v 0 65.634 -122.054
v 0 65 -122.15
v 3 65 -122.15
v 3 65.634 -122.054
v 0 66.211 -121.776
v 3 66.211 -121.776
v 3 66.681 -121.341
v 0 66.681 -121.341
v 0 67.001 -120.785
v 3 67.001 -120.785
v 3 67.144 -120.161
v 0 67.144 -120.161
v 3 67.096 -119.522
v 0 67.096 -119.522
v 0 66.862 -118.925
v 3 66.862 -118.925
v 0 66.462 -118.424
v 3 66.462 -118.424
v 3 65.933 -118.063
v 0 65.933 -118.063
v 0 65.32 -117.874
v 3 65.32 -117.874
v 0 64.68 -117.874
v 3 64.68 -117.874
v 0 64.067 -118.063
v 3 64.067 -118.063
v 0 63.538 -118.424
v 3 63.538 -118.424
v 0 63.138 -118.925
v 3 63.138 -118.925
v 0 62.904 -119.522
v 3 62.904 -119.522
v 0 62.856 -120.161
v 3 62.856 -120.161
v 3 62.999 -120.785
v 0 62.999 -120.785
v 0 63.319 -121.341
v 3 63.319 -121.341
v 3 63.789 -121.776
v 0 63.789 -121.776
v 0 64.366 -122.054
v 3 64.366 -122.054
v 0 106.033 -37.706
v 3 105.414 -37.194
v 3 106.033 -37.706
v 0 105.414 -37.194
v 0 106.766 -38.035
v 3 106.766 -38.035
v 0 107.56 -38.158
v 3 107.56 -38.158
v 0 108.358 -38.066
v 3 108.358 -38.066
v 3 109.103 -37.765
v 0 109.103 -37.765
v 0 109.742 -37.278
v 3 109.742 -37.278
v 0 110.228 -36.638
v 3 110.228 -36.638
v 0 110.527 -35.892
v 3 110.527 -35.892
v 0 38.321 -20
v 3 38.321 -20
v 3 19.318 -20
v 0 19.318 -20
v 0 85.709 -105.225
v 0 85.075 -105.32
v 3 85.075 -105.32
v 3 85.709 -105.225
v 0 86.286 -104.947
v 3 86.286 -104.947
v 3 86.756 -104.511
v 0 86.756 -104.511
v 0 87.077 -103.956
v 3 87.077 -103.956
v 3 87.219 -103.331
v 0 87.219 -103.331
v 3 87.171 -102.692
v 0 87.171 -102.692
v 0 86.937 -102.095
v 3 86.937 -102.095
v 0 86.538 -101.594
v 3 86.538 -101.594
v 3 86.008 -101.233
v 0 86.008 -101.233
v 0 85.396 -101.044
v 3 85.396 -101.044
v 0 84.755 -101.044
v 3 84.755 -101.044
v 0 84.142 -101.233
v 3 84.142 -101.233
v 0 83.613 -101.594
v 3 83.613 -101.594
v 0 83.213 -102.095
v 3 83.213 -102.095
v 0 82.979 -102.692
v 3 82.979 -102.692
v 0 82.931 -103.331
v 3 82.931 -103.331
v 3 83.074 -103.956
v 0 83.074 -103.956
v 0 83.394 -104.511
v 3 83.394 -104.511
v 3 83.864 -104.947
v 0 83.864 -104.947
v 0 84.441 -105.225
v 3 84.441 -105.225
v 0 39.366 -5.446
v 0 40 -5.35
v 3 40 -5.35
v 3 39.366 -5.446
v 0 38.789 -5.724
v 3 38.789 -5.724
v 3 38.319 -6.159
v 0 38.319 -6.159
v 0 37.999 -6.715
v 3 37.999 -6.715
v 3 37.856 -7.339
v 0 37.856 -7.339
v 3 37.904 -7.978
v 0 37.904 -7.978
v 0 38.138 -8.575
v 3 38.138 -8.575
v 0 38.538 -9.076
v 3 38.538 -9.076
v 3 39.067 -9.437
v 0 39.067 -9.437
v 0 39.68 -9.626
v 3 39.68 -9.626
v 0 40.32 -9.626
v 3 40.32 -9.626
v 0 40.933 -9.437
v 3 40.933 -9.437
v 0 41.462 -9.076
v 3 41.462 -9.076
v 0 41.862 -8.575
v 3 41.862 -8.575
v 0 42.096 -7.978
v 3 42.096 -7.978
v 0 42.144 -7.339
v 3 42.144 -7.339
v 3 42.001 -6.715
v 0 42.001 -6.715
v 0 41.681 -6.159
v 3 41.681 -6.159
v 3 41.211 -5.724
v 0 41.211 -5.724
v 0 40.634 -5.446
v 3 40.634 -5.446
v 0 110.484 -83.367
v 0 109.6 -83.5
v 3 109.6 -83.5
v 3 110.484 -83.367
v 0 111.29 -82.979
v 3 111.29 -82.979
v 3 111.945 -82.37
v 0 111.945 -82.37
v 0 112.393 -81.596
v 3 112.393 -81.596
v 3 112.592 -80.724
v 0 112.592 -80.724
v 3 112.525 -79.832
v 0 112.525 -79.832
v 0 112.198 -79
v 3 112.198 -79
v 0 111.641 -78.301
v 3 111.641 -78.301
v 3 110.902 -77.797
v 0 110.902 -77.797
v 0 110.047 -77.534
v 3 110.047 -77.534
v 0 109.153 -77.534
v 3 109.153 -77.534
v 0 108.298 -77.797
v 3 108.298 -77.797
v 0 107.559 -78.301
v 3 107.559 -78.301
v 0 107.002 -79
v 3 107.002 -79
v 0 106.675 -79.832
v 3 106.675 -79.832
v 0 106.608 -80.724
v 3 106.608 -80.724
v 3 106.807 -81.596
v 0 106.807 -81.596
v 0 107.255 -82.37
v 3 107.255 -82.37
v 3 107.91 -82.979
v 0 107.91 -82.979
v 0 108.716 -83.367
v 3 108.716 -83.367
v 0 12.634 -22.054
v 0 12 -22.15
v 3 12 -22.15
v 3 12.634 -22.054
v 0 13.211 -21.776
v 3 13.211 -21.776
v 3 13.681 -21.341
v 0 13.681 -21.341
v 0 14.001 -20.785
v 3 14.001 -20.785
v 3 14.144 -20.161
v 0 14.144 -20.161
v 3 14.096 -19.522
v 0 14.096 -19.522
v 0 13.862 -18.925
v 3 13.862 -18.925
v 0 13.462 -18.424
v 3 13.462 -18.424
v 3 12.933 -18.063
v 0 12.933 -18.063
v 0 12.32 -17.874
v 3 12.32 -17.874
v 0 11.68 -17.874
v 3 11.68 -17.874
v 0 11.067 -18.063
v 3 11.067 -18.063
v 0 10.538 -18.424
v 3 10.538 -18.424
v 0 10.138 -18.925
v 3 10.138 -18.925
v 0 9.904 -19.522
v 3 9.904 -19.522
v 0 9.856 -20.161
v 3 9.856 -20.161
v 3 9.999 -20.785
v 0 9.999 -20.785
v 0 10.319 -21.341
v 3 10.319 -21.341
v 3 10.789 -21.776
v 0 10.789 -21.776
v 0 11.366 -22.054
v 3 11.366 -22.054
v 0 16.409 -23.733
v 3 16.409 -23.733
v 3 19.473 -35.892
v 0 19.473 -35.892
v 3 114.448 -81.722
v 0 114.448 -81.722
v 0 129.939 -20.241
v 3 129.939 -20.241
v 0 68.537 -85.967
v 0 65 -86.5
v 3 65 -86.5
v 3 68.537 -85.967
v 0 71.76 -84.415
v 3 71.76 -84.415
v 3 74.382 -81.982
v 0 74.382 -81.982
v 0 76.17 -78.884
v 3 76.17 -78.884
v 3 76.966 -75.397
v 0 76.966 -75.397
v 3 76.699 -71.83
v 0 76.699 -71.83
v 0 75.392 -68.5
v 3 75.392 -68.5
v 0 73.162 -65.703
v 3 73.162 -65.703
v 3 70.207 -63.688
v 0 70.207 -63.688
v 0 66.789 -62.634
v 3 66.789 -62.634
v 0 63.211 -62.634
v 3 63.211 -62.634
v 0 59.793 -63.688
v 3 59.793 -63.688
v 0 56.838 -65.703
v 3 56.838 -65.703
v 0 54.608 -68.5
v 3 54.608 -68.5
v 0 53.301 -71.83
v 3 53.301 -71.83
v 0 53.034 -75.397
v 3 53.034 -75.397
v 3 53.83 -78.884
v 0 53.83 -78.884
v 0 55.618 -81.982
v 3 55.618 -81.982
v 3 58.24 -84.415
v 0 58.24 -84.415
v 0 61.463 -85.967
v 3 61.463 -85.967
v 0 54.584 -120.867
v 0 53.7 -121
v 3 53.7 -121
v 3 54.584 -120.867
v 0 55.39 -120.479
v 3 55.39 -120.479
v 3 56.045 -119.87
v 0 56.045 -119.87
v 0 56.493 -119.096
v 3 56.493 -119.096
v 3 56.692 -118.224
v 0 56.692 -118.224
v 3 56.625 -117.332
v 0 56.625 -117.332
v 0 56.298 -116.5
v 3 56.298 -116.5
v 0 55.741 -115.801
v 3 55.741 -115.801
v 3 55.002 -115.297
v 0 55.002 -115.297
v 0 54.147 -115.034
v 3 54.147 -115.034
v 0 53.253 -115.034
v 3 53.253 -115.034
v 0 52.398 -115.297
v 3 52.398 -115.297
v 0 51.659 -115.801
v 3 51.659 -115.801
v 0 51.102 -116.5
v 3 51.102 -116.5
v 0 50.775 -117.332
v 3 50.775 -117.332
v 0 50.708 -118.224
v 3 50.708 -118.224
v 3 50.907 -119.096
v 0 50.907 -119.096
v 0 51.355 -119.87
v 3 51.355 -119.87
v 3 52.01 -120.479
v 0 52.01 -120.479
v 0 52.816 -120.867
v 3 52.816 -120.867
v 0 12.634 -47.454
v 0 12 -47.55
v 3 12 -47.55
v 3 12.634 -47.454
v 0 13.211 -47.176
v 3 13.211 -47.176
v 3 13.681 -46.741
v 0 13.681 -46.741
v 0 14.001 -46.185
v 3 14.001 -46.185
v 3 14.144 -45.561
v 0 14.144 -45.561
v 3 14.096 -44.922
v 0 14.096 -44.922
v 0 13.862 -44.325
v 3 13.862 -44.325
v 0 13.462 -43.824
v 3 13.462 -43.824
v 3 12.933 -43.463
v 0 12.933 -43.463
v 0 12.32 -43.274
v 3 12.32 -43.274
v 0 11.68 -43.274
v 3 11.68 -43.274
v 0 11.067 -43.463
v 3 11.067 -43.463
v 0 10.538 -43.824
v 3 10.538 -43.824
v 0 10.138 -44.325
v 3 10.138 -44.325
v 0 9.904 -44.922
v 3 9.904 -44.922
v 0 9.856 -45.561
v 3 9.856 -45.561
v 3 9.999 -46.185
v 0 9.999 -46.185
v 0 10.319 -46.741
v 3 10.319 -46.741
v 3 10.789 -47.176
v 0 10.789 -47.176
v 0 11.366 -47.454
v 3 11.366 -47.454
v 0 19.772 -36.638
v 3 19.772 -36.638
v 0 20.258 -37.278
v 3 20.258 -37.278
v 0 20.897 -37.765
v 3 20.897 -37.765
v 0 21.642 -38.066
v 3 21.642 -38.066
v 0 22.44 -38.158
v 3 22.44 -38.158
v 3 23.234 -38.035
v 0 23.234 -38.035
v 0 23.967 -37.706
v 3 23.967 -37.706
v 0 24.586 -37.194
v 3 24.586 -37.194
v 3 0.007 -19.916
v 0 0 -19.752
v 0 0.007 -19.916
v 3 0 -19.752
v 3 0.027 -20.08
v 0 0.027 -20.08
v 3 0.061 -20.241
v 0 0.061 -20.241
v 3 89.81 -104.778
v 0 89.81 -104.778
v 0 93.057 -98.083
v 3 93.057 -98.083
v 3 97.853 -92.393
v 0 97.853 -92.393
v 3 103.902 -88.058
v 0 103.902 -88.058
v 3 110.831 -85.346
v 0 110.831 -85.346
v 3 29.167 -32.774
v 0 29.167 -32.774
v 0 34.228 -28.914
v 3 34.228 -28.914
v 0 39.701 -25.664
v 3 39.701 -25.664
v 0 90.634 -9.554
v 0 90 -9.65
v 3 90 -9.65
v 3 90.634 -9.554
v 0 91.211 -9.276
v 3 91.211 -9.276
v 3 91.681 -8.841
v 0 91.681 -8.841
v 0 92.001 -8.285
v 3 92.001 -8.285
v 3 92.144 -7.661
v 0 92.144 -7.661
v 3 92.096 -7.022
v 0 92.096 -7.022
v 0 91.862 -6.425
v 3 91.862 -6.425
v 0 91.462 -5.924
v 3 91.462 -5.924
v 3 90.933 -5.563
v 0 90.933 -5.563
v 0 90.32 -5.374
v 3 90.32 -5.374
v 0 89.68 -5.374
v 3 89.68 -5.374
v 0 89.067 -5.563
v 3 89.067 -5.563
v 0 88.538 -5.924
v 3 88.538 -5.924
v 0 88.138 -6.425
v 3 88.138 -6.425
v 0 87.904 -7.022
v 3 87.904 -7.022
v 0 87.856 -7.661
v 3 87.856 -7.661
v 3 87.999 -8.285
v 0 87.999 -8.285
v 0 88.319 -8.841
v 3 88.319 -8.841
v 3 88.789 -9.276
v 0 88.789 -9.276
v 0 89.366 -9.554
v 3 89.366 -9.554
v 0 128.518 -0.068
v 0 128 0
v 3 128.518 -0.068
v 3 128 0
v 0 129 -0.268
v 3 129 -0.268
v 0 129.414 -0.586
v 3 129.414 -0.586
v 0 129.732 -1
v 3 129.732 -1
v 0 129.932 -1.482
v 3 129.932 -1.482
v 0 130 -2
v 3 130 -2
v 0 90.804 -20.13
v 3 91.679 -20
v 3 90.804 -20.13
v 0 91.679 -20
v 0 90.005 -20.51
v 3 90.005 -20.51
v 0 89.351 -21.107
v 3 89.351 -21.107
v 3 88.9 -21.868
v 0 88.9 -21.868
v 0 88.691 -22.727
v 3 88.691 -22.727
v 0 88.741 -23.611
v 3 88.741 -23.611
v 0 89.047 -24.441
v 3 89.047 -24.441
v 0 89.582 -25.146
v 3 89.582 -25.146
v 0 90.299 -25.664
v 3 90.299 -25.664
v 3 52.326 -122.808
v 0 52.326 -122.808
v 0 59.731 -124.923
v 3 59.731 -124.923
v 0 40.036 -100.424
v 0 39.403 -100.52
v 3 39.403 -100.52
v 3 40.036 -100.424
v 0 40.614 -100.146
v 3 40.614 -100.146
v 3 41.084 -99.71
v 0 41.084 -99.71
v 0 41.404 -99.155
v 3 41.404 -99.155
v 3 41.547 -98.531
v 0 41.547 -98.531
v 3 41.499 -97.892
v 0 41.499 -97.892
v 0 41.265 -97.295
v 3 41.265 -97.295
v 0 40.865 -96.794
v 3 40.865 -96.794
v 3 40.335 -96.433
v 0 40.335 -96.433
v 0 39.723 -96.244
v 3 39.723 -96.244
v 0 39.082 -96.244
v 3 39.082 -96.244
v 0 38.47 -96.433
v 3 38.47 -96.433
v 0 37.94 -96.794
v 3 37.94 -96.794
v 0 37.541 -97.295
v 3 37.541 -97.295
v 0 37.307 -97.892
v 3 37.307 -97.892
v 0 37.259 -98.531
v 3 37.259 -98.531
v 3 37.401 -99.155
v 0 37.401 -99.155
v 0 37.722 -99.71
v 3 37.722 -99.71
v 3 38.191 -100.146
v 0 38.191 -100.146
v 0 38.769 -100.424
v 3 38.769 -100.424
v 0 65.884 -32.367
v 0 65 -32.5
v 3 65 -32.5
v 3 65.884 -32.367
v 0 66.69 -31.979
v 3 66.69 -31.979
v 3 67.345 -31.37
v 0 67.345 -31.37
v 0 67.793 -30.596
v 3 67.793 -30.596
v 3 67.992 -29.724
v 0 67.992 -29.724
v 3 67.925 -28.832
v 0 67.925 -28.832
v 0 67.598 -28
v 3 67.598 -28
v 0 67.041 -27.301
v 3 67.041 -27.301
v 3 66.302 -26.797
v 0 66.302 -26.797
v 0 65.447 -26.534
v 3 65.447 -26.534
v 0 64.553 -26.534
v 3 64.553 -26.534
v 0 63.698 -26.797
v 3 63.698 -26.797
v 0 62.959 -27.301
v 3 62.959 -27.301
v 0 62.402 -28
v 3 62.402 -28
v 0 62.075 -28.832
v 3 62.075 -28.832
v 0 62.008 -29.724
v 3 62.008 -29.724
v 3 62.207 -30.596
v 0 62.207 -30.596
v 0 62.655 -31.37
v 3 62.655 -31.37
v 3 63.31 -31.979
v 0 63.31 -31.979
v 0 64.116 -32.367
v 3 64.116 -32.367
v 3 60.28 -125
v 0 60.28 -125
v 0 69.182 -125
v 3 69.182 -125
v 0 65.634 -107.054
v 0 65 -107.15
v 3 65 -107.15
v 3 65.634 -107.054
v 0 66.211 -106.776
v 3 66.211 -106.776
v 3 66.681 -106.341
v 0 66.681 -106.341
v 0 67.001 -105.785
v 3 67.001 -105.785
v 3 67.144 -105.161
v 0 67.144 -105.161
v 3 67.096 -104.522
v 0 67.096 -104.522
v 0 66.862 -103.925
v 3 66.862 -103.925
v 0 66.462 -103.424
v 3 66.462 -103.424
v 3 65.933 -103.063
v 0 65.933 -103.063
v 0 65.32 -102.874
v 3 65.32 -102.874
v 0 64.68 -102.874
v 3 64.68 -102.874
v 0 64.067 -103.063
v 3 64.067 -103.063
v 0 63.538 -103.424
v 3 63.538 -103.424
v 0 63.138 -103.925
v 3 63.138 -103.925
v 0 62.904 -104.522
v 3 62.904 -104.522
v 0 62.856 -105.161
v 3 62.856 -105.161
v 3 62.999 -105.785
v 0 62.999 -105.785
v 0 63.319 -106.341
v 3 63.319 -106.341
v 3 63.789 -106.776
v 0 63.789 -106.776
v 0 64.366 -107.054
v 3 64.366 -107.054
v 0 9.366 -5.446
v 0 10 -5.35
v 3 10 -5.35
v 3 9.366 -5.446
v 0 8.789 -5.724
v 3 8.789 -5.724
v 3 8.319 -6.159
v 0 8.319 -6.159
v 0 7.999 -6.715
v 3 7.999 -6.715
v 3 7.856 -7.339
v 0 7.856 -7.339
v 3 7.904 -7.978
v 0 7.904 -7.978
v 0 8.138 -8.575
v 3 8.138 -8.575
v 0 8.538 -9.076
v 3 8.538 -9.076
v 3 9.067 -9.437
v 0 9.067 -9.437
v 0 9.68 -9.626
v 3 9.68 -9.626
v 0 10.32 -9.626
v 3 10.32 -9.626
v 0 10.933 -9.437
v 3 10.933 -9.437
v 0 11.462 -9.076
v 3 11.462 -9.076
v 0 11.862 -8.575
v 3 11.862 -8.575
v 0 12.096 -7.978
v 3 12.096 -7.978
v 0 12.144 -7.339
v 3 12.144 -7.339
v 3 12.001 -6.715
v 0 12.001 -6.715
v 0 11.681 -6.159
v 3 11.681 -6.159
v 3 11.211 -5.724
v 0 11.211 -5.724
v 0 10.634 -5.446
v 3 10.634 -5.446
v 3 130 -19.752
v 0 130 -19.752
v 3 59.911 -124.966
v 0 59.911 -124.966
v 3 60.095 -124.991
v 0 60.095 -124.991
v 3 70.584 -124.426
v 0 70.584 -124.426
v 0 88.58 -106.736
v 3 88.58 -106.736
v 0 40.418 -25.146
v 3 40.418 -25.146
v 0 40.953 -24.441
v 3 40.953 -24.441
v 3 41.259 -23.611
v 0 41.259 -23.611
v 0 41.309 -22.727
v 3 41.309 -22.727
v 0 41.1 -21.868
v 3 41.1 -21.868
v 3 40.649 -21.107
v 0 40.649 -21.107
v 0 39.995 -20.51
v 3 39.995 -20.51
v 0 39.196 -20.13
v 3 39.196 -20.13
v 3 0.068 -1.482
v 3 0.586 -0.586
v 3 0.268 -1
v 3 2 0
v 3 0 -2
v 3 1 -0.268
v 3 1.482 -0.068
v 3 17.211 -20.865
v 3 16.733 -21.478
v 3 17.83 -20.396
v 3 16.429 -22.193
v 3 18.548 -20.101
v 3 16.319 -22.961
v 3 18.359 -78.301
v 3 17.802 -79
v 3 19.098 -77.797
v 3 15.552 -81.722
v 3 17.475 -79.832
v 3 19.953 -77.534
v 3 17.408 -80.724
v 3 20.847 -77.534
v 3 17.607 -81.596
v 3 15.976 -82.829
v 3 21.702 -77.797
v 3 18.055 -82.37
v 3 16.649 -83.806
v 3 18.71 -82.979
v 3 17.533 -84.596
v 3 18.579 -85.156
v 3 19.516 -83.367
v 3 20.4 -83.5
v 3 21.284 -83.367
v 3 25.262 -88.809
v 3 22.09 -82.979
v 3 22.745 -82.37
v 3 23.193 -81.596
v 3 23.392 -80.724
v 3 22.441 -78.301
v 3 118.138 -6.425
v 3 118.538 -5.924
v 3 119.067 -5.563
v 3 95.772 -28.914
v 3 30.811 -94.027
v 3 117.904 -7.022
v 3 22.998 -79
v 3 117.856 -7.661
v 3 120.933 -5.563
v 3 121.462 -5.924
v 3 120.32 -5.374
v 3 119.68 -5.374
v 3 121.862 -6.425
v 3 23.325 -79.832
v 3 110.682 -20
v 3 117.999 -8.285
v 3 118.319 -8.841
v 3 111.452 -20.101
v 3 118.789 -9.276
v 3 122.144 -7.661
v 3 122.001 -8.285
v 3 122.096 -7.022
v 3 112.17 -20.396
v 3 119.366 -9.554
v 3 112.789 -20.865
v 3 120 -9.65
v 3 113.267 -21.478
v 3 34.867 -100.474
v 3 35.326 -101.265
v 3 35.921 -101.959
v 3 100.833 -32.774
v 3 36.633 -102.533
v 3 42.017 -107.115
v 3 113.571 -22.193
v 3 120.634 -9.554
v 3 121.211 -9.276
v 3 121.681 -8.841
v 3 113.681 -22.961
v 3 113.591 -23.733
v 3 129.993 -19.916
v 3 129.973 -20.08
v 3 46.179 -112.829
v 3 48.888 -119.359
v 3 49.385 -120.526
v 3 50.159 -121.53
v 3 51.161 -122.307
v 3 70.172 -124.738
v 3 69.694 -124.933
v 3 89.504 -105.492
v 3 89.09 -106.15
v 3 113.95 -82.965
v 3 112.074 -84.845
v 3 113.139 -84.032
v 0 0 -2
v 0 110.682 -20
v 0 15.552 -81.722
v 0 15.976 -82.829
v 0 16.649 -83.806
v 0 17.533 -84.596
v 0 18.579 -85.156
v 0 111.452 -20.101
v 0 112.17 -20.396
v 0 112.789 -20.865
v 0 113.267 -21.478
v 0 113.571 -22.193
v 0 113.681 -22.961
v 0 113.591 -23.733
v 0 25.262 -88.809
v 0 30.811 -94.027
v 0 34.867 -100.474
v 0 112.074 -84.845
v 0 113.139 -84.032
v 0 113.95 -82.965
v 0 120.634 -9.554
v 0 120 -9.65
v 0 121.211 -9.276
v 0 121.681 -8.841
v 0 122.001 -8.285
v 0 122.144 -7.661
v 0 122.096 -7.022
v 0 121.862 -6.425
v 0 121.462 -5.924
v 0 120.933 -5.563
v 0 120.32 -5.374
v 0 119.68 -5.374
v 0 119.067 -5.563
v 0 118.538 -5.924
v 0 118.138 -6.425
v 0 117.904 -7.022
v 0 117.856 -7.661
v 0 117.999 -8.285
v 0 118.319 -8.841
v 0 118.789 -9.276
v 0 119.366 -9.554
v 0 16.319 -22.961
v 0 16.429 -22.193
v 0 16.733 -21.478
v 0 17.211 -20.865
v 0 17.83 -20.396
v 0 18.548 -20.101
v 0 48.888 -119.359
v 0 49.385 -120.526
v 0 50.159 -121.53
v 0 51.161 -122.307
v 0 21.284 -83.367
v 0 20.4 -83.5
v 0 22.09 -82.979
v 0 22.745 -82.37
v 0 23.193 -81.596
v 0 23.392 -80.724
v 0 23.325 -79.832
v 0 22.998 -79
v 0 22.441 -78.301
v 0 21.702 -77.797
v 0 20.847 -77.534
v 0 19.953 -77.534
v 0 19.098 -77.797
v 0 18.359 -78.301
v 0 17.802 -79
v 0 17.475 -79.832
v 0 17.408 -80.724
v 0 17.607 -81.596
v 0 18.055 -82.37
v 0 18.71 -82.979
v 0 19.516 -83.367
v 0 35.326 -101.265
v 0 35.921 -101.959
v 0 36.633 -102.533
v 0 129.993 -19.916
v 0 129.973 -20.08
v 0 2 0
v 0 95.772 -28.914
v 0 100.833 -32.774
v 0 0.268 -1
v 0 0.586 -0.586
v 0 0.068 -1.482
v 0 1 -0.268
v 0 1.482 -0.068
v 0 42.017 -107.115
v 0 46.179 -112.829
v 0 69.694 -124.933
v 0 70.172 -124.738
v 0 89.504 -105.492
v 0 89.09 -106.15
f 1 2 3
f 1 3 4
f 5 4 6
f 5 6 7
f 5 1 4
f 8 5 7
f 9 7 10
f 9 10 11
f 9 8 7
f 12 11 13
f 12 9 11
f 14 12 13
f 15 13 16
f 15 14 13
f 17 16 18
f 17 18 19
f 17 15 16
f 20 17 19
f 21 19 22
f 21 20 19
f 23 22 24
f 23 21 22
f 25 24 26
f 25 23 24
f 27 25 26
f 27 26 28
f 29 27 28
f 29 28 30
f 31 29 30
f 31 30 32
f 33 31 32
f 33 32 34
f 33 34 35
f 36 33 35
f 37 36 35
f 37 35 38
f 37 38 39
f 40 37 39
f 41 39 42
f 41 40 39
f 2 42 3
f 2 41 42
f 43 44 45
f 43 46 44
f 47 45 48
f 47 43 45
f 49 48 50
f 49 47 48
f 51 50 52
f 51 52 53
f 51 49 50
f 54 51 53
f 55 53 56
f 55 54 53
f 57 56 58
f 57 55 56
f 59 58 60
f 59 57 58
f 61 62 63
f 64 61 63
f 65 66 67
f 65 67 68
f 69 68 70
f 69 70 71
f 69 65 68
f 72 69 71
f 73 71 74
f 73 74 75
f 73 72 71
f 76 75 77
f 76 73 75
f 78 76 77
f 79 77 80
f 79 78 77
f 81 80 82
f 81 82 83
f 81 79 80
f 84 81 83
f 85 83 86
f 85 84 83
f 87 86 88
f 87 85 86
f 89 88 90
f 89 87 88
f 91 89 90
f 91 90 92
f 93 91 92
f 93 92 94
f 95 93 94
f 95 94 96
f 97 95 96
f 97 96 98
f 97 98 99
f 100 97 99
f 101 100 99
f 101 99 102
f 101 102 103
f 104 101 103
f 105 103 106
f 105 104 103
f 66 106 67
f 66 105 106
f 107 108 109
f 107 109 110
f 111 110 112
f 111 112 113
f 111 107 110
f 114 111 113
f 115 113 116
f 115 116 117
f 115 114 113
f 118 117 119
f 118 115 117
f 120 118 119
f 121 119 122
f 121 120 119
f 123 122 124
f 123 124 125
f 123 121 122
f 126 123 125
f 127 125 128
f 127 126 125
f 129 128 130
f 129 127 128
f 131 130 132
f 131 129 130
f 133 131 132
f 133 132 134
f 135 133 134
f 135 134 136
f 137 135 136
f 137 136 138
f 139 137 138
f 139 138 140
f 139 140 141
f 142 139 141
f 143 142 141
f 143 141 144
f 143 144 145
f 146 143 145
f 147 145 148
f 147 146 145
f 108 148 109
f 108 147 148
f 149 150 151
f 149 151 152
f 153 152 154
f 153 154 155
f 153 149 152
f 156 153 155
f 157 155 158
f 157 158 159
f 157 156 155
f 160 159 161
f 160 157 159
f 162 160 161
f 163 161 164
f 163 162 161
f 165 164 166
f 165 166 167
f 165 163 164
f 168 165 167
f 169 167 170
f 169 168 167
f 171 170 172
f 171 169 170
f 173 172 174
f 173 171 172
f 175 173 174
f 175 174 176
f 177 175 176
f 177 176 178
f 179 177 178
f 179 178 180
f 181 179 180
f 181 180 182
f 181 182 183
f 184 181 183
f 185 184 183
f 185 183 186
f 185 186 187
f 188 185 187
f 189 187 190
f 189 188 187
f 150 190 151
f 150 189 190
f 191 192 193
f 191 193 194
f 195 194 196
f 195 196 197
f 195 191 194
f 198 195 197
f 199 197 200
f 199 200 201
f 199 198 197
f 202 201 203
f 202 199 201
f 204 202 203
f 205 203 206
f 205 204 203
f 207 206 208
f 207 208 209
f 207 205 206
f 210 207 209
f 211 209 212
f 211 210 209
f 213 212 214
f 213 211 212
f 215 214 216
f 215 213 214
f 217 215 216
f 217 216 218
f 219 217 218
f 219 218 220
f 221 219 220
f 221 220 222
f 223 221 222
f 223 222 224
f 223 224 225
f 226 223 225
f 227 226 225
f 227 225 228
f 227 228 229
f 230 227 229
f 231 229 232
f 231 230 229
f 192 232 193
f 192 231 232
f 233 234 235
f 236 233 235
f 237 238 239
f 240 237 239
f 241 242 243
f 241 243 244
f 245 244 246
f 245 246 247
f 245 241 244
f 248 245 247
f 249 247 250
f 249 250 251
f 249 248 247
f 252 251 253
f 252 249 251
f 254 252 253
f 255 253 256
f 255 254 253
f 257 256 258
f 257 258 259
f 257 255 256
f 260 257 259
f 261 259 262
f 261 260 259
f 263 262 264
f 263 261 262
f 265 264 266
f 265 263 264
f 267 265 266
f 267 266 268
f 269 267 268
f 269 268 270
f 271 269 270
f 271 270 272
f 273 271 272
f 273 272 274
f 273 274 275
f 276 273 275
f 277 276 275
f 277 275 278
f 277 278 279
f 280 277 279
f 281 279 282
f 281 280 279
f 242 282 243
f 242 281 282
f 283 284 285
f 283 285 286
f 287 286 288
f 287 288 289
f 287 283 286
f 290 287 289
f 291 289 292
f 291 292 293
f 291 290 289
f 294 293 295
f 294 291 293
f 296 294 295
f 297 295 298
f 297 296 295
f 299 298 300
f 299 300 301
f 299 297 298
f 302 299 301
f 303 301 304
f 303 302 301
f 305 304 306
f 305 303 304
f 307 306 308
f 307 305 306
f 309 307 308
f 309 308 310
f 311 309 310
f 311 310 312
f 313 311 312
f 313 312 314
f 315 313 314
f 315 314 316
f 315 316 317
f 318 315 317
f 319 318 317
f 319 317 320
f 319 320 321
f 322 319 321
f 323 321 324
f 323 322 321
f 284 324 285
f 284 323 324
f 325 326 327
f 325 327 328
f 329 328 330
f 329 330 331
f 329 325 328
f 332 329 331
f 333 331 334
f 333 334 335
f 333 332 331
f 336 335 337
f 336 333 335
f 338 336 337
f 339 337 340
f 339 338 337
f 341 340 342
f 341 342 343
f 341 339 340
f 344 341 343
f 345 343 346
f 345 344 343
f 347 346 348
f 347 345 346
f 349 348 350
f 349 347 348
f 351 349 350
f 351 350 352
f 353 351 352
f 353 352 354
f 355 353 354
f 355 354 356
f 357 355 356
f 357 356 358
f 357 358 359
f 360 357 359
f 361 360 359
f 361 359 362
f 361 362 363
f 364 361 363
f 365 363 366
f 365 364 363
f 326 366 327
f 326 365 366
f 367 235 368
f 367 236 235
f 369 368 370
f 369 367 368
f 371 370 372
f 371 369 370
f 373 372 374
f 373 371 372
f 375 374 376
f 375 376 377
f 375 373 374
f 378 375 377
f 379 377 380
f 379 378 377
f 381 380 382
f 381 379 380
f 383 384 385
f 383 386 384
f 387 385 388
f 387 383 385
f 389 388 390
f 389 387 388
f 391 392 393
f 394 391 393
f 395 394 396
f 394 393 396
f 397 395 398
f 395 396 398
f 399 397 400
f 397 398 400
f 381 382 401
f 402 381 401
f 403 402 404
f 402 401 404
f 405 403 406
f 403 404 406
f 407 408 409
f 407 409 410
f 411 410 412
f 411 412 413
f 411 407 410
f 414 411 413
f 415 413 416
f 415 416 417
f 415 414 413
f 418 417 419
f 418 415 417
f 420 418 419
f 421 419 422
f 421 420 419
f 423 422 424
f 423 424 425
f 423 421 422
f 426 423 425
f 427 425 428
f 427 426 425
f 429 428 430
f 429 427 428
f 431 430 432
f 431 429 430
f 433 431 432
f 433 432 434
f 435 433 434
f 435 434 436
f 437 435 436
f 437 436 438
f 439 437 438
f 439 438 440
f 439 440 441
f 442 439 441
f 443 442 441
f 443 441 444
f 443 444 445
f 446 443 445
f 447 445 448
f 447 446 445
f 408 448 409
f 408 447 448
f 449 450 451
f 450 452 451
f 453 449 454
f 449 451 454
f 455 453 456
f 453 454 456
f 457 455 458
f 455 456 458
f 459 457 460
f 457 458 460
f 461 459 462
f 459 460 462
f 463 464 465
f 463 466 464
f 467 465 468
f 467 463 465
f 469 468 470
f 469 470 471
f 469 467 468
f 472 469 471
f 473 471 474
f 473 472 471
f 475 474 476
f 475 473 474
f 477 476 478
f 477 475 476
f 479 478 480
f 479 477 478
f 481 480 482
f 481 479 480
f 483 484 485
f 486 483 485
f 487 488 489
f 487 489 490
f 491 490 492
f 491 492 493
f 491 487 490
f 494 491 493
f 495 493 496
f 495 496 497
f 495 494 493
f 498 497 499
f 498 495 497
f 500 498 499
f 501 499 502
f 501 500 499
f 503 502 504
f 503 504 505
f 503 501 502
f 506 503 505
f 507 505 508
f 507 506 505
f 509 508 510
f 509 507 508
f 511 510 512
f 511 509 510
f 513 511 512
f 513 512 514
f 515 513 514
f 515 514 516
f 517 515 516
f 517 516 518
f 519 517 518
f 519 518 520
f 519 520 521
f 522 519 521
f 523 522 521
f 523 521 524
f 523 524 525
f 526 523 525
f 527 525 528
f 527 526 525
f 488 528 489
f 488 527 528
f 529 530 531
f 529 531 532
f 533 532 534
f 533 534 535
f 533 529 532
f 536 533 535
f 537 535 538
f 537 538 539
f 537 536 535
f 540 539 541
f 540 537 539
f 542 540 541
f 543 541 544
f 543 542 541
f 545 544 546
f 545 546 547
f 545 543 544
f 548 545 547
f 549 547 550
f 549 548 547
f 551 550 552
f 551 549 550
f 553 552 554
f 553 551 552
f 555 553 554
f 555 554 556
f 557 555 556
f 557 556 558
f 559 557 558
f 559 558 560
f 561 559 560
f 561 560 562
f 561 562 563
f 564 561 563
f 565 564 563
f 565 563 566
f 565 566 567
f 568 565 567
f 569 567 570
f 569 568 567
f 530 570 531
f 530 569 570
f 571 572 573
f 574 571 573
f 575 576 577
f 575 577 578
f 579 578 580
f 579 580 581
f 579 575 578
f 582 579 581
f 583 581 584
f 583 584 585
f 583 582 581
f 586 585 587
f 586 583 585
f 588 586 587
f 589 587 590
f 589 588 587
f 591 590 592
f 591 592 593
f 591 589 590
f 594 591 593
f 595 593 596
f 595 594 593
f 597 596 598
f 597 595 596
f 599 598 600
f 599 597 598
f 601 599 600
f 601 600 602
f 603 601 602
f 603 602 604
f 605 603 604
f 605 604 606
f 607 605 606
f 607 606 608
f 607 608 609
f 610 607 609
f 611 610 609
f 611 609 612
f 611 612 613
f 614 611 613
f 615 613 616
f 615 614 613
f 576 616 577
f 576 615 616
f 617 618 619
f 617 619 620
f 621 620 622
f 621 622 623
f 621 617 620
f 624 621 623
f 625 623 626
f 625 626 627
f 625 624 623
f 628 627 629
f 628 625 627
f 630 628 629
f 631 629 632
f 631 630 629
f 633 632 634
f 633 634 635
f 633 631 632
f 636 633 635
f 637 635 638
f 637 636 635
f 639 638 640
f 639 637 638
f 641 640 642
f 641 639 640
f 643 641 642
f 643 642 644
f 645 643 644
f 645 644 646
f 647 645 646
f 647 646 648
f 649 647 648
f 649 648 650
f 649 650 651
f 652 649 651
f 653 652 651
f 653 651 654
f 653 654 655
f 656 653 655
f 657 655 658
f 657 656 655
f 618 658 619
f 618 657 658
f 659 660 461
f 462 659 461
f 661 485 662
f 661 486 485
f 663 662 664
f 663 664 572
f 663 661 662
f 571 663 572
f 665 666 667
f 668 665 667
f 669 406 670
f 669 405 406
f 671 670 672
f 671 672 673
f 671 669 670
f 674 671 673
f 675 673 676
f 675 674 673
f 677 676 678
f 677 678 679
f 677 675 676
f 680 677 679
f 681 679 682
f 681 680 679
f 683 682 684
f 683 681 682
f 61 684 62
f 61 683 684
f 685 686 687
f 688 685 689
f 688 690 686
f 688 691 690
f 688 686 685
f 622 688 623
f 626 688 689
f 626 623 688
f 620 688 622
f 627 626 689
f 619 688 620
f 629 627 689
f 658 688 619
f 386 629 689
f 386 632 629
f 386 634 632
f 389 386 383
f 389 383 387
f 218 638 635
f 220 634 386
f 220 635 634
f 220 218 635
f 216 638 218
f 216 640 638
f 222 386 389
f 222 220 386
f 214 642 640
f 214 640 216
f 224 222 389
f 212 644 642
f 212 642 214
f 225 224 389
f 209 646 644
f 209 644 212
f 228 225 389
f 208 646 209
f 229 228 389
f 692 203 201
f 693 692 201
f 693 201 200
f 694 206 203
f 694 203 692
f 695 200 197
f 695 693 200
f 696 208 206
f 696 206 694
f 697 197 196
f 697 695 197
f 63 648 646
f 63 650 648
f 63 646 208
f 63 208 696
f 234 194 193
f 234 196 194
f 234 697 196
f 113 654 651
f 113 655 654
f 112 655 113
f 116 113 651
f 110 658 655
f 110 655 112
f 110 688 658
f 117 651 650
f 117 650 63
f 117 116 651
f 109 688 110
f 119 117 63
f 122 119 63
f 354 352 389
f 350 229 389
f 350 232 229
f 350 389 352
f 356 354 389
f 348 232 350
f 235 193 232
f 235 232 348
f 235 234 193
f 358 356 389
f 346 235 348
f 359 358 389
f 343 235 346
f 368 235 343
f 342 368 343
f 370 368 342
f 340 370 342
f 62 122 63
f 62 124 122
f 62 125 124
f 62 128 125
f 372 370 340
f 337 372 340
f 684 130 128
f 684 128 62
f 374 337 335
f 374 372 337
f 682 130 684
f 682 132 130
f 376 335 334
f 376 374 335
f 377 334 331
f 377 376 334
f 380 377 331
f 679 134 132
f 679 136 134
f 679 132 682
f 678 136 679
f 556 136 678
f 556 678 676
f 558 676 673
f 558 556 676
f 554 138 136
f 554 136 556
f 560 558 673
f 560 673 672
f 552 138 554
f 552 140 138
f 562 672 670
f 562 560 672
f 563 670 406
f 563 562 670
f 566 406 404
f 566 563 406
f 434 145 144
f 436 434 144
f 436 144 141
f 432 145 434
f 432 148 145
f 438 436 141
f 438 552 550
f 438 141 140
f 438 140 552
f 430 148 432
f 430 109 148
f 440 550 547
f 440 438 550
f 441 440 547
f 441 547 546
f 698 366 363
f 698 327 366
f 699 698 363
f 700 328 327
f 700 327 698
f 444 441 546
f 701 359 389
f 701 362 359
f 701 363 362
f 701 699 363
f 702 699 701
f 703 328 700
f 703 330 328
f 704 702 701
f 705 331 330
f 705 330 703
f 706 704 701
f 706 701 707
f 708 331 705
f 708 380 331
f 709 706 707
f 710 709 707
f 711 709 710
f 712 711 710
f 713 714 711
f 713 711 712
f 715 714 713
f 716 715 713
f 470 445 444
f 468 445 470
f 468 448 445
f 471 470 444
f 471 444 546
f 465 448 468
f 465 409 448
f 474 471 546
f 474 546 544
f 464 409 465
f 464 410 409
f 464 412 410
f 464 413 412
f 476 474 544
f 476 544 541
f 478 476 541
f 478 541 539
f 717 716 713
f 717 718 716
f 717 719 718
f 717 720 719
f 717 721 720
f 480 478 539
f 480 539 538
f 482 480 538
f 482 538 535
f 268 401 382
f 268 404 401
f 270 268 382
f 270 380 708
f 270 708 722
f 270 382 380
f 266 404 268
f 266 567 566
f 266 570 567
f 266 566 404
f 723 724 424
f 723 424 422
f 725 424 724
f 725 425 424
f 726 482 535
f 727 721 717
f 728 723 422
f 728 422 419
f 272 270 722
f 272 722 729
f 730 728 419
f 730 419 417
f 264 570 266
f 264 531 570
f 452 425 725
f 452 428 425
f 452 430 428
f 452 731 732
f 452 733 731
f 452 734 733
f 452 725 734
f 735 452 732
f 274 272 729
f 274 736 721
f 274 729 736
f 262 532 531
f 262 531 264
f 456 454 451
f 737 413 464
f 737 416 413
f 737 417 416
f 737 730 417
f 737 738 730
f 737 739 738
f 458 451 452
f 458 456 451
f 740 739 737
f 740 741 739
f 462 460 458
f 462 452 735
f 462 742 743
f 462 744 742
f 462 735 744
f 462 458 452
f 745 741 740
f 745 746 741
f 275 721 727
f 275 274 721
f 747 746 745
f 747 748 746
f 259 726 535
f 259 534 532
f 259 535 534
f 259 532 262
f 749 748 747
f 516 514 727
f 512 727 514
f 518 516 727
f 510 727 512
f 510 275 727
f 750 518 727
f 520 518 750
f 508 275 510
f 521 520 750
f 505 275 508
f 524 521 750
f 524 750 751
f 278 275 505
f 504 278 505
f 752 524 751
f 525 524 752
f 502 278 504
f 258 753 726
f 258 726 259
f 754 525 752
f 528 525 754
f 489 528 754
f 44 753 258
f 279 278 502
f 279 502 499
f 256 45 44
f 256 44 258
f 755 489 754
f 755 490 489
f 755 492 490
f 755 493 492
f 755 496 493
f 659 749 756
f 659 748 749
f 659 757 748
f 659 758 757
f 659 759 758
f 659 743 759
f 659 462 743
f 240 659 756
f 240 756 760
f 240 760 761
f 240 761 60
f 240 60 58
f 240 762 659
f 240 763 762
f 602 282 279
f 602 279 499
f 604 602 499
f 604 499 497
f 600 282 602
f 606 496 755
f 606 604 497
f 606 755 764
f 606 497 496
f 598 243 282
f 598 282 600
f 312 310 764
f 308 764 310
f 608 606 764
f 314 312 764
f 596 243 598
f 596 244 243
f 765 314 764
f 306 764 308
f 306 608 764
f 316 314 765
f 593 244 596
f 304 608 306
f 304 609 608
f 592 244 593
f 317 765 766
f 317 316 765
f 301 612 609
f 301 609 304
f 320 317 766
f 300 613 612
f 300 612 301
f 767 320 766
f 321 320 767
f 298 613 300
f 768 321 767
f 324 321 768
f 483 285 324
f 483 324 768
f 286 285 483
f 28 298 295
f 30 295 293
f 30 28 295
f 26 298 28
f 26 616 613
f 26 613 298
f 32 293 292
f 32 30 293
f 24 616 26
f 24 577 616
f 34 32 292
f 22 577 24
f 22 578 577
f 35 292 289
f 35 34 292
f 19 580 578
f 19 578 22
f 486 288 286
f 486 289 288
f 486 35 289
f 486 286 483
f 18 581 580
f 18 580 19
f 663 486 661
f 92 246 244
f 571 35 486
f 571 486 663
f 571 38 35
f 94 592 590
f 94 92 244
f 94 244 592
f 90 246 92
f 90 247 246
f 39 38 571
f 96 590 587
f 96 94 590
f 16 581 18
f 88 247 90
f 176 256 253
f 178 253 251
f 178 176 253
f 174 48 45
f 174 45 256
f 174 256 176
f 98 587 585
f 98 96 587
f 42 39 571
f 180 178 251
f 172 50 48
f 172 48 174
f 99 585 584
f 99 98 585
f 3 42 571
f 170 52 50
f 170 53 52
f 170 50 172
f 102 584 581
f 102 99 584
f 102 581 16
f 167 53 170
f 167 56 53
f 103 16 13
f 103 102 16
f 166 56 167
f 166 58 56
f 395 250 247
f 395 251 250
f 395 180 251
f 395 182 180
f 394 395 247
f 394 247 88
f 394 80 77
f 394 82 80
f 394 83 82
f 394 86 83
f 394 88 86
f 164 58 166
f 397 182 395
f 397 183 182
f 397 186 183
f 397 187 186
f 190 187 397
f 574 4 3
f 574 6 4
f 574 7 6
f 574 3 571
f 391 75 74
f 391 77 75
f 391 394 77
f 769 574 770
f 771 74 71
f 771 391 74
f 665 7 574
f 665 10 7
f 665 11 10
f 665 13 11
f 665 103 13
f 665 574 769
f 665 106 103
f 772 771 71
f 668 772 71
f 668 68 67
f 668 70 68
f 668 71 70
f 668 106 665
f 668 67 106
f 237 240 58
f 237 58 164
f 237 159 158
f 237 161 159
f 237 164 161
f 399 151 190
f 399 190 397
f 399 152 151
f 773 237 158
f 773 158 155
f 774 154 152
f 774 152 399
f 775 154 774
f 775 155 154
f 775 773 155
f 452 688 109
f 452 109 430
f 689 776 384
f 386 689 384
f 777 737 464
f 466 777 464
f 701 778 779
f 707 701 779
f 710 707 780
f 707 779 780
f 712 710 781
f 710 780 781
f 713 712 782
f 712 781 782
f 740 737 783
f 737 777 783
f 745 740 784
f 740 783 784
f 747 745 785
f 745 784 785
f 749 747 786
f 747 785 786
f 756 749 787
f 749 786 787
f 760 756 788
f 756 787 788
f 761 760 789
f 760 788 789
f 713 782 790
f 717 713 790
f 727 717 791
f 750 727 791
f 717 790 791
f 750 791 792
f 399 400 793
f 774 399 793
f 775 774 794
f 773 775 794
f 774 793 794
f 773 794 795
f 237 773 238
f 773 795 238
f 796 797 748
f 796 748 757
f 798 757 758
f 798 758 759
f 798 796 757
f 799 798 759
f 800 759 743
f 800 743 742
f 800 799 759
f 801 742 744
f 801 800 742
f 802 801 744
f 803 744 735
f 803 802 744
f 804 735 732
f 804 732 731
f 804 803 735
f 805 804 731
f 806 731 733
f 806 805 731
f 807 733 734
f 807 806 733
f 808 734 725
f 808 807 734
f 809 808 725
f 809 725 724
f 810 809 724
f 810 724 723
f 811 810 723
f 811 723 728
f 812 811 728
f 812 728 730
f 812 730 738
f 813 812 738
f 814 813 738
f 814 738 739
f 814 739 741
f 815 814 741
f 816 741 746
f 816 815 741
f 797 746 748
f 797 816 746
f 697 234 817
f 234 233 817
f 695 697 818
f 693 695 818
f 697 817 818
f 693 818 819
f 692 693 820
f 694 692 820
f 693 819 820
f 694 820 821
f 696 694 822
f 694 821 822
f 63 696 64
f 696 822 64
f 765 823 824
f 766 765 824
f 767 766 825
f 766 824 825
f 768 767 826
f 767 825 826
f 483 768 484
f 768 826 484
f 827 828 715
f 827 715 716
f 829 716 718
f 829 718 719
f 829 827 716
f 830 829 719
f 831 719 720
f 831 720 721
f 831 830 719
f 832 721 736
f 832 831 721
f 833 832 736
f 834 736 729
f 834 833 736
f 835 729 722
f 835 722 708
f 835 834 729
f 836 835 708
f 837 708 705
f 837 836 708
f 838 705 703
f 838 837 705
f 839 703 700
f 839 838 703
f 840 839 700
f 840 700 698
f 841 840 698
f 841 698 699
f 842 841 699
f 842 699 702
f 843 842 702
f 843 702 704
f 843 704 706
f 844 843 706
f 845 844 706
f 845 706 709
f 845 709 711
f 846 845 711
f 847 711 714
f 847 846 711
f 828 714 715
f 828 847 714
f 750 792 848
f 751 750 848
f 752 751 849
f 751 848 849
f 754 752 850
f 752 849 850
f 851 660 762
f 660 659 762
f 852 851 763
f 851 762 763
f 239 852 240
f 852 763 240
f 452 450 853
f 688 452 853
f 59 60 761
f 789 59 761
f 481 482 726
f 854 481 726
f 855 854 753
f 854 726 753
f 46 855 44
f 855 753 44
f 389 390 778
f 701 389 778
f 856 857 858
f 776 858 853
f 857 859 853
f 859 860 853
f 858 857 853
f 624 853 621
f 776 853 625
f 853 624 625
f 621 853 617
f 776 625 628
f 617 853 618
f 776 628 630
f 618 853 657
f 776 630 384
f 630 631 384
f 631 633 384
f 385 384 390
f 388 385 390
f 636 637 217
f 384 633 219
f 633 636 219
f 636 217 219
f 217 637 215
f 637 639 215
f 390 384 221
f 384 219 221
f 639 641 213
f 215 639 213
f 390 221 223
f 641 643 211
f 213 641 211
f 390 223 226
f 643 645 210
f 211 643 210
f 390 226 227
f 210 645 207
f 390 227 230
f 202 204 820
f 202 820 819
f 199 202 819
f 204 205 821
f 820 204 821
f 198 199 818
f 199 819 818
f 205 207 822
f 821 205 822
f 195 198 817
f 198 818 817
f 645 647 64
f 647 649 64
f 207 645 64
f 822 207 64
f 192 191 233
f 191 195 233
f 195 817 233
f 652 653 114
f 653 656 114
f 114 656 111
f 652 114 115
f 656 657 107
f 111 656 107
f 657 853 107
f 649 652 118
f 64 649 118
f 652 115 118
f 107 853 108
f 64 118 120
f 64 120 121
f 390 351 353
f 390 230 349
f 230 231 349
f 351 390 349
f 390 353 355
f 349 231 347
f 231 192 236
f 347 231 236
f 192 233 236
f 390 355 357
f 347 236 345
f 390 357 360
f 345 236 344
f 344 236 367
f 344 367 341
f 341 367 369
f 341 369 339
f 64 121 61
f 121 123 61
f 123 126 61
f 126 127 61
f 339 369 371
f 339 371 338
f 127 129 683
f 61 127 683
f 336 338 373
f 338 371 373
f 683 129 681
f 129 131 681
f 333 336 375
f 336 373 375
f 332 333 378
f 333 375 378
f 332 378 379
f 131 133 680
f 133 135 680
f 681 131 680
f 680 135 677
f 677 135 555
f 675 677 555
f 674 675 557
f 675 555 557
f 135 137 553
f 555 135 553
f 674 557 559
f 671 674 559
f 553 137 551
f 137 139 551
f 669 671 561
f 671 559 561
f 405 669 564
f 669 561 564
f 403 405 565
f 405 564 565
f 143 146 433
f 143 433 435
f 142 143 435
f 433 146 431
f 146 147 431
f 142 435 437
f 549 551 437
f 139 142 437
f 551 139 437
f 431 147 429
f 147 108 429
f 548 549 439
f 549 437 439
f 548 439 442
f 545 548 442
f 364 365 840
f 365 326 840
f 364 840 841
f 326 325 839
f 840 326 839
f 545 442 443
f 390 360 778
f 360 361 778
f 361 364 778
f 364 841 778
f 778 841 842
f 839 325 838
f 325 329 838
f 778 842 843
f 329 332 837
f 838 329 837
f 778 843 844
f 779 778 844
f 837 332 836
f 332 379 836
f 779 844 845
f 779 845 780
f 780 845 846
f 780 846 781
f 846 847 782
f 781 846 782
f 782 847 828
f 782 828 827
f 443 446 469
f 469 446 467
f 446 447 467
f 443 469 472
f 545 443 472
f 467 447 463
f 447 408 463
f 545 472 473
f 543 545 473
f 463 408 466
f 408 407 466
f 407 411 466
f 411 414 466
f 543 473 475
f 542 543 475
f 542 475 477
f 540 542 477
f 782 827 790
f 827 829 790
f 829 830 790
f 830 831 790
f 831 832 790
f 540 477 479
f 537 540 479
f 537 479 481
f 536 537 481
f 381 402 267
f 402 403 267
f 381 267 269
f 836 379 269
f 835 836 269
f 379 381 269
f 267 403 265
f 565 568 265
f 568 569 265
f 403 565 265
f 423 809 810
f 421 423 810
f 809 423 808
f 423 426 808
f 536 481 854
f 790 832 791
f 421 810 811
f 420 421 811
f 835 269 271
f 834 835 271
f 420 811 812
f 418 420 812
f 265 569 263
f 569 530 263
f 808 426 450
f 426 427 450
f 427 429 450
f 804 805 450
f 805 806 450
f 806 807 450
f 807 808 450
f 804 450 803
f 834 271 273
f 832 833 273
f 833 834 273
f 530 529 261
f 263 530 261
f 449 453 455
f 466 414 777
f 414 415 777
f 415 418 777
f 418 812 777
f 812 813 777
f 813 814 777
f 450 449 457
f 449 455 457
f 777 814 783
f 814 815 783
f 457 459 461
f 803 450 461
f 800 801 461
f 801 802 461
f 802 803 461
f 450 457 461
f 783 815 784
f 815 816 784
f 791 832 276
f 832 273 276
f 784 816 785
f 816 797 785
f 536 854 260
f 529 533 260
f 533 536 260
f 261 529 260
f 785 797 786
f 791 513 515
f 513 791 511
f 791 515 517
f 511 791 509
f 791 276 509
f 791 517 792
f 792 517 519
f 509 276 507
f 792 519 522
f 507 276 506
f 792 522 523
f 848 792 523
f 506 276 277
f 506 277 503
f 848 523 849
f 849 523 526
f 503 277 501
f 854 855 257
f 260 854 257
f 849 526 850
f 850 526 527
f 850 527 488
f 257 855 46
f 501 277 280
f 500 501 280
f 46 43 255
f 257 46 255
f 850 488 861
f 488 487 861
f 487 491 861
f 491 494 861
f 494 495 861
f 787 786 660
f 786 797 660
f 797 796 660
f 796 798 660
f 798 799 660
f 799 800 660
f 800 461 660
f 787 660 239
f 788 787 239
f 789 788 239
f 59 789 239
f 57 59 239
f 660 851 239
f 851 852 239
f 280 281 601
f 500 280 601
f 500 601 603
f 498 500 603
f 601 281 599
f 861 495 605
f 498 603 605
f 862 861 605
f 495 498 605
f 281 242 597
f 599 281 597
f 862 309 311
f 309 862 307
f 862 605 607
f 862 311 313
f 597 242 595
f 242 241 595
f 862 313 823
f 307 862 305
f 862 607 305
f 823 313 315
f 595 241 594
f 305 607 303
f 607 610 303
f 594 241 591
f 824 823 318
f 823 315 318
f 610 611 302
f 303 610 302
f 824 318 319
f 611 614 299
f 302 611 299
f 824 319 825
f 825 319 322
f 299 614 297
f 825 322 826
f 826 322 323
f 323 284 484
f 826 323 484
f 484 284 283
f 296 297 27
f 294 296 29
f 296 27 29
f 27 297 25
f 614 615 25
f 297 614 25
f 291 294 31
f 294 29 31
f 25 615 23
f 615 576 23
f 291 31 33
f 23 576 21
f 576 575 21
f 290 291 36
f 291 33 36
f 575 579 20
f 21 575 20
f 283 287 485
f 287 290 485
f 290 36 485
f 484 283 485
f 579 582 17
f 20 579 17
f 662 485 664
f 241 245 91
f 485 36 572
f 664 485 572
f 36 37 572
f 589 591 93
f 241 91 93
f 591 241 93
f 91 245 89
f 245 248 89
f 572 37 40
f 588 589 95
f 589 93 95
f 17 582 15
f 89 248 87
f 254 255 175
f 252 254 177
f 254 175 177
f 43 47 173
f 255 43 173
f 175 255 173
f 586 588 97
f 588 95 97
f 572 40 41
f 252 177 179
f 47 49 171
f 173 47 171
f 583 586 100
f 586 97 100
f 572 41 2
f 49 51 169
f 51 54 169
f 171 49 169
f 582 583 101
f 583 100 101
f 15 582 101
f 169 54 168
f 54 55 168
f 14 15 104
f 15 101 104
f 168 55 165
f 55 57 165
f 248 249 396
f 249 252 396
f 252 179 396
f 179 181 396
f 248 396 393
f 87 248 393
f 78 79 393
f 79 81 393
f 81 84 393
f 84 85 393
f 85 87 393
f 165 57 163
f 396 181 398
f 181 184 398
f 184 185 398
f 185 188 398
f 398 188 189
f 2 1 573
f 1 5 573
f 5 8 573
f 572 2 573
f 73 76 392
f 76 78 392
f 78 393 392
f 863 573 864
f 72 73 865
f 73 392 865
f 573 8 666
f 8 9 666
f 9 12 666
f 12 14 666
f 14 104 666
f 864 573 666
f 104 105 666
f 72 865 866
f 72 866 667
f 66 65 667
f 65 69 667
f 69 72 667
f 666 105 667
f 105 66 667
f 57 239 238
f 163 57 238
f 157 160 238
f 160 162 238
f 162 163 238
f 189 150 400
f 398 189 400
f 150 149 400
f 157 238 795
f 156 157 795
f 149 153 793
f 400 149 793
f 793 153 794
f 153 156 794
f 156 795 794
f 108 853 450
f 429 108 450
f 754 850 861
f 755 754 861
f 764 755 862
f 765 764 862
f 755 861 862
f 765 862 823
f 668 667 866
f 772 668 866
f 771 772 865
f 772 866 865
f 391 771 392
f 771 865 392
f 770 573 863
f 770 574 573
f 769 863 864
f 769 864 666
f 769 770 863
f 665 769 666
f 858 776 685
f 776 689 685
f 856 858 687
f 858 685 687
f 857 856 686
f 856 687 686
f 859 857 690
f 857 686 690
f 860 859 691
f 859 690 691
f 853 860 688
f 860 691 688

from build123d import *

# Parameters (mm, degrees)
SKETCH_1_R          = 2.15
SKETCH_1_R_2        = 12
SKETCH_1_R_3        = 3
EXTRUDE_1_DEPTH     = 3
CUT_EXTRUDE_1_DEPTH = 3
FILLET_1_R          = 2
FILLET_2_R          = 2
FILLET_3_R          = 3


with BuildPart() as part:
    # ｽｹｯﾁ1 → ﾎﾞｽ - 押し出し1 (new body)
    with BuildSketch(Plane(origin=(0, 0, 0), x_dir=(0, 0, -1), z_dir=(1, 0, 0))):
        with BuildLine():
            Line((0, 0), (20, 0))
            Line((20, 0), (81.721631315, 15.55153458))
            ThreePointArc((81.721631315, 15.55153458), (83.805915962, 16.648877548), (85.156498305, 18.57873024))
            ThreePointArc((85.156498305, 18.57873024), (91.240951268, 28.202978223), (100.473591964, 34.86669062))
            ThreePointArc((100.473591964, 34.86669062), (101.625387424, 35.607613327), (102.53294649, 36.633252532))
            ThreePointArc((102.53294649, 36.633252532), (109.848876527, 44.266796828), (119.358709974, 48.888149295))
            ThreePointArc((119.358709974, 48.888149295), (121.530071674, 50.159012288), (122.807632728, 52.326439826))
            Line((122.807632728, 52.326439826), (125, 60))
            Line((125, 60), (125, 70))
            Line((125, 70), (106.736076333, 88.580227744))
            ThreePointArc((106.736076333, 88.580227744), (105.828986144, 89.309735766), (104.777796911, 89.809731531))
            ThreePointArc((104.777796911, 89.809731531), (92.392887273, 97.853140314), (85.346092725, 110.831009869))
            ThreePointArc((85.346092725, 110.831009869), (84.032111964, 113.138952539), (81.721631315, 114.44846542))
            Line((81.721631315, 114.44846542), (20, 130))
            Line((20, 130), (0, 130))
            Line((0, 130), (0, 0))
        make_face()
        with Locations((7.5, 120)):
            Circle(SKETCH_1_R, mode=Mode.SUBTRACT)
        with Locations((7.5, 90)):
            Circle(SKETCH_1_R, mode=Mode.SUBTRACT)
        with Locations(Location((7.5, 40, 0), (0, 0, 180))):
            Circle(SKETCH_1_R, mode=Mode.SUBTRACT)
        with Locations(Location((7.5, 10, 0), (0, 0, 180))):
            Circle(SKETCH_1_R, mode=Mode.SUBTRACT)
        with Locations((74.5, 65)):
            Circle(SKETCH_1_R_2, mode=Mode.SUBTRACT)
        with Locations((29.5, 65)):
            Circle(SKETCH_1_R_3, mode=Mode.SUBTRACT)
        with Locations((80.5, 20.4)):
            Circle(SKETCH_1_R_3, mode=Mode.SUBTRACT)
        with Locations((118, 53.7)):
            Circle(SKETCH_1_R_3, mode=Mode.SUBTRACT)
        with Locations((80.5, 109.6)):
            Circle(SKETCH_1_R_3, mode=Mode.SUBTRACT)
        with Locations((103.17032155, 85.075175272)):
            Circle(SKETCH_1_R, mode=Mode.SUBTRACT)
        with Locations((98.369942602, 39.402620443)):
            Circle(SKETCH_1_R, mode=Mode.SUBTRACT)
        with Locations((105, 65)):
            Circle(SKETCH_1_R, mode=Mode.SUBTRACT)
        with Locations((120, 65)):
            Circle(SKETCH_1_R, mode=Mode.SUBTRACT)
        with Locations((20, 12)):
            Circle(SKETCH_1_R, mode=Mode.SUBTRACT)
        with Locations((45.4, 12)):
            Circle(SKETCH_1_R, mode=Mode.SUBTRACT)
    extrude(amount=EXTRUDE_1_DEPTH)

    # ｽｹｯﾁ2 → ｶｯﾄ - 押し出し1 (cut)
    with BuildSketch(Plane(origin=(3, 0, 0), x_dir=(0, 0, -1), z_dir=(1, 0, 0))):
        with BuildLine():
            Line((20, 114.531188015), (20, 72.399324293))
            ThreePointArc((20, 72.399324293), (27.112840869, 92.918759813), (41.614001532, 109.085270837))
            Line((41.614001532, 109.085270837), (20, 114.531188015))
        make_face()
        with BuildLine():
            Line((20, 15.468811985), (41.614001532, 20.914729163))
            ThreePointArc((41.614001532, 20.914729163), (27.112840869, 37.081240187), (20, 57.600675707))
            Line((20, 57.600675707), (20, 15.468811985))
        make_face()
    extrude(amount=-CUT_EXTRUDE_1_DEPTH, mode=Mode.SUBTRACT)

    # ﾌｨﾚｯﾄ1
    fillet_1_edges = [part.edges().sort_by_distance(p)[0] for p in [
        (1.5, 130, 0),
        (1.5, 130, -20),
        (1.5, 0, -20),
        (1.5, 0, 0),
    ]]
    fillet(fillet_1_edges, radius=FILLET_1_R)

    # ﾌｨﾚｯﾄ2
    fillet_2_edges = [part.edges().sort_by_distance(p)[0] for p in [
        (1.5, 70, -125),
        (1.5, 60, -125),
    ]]
    fillet(fillet_2_edges, radius=FILLET_2_R)

    # ﾌｨﾚｯﾄ3
    fillet_3_edges = [part.edges().sort_by_distance(p)[0] for p in [
        (1.5, 114.531188015, -20),
        (1.5, 109.085270837, -41.614001532),
        (1.5, 72.399324293, -20),
        (1.5, 15.468811985, -20),
        (1.5, 57.600675707, -20),
        (1.5, 20.914729163, -41.614001532),
    ]]
    fillet(fillet_3_edges, radius=FILLET_3_R)


solid = part.part
